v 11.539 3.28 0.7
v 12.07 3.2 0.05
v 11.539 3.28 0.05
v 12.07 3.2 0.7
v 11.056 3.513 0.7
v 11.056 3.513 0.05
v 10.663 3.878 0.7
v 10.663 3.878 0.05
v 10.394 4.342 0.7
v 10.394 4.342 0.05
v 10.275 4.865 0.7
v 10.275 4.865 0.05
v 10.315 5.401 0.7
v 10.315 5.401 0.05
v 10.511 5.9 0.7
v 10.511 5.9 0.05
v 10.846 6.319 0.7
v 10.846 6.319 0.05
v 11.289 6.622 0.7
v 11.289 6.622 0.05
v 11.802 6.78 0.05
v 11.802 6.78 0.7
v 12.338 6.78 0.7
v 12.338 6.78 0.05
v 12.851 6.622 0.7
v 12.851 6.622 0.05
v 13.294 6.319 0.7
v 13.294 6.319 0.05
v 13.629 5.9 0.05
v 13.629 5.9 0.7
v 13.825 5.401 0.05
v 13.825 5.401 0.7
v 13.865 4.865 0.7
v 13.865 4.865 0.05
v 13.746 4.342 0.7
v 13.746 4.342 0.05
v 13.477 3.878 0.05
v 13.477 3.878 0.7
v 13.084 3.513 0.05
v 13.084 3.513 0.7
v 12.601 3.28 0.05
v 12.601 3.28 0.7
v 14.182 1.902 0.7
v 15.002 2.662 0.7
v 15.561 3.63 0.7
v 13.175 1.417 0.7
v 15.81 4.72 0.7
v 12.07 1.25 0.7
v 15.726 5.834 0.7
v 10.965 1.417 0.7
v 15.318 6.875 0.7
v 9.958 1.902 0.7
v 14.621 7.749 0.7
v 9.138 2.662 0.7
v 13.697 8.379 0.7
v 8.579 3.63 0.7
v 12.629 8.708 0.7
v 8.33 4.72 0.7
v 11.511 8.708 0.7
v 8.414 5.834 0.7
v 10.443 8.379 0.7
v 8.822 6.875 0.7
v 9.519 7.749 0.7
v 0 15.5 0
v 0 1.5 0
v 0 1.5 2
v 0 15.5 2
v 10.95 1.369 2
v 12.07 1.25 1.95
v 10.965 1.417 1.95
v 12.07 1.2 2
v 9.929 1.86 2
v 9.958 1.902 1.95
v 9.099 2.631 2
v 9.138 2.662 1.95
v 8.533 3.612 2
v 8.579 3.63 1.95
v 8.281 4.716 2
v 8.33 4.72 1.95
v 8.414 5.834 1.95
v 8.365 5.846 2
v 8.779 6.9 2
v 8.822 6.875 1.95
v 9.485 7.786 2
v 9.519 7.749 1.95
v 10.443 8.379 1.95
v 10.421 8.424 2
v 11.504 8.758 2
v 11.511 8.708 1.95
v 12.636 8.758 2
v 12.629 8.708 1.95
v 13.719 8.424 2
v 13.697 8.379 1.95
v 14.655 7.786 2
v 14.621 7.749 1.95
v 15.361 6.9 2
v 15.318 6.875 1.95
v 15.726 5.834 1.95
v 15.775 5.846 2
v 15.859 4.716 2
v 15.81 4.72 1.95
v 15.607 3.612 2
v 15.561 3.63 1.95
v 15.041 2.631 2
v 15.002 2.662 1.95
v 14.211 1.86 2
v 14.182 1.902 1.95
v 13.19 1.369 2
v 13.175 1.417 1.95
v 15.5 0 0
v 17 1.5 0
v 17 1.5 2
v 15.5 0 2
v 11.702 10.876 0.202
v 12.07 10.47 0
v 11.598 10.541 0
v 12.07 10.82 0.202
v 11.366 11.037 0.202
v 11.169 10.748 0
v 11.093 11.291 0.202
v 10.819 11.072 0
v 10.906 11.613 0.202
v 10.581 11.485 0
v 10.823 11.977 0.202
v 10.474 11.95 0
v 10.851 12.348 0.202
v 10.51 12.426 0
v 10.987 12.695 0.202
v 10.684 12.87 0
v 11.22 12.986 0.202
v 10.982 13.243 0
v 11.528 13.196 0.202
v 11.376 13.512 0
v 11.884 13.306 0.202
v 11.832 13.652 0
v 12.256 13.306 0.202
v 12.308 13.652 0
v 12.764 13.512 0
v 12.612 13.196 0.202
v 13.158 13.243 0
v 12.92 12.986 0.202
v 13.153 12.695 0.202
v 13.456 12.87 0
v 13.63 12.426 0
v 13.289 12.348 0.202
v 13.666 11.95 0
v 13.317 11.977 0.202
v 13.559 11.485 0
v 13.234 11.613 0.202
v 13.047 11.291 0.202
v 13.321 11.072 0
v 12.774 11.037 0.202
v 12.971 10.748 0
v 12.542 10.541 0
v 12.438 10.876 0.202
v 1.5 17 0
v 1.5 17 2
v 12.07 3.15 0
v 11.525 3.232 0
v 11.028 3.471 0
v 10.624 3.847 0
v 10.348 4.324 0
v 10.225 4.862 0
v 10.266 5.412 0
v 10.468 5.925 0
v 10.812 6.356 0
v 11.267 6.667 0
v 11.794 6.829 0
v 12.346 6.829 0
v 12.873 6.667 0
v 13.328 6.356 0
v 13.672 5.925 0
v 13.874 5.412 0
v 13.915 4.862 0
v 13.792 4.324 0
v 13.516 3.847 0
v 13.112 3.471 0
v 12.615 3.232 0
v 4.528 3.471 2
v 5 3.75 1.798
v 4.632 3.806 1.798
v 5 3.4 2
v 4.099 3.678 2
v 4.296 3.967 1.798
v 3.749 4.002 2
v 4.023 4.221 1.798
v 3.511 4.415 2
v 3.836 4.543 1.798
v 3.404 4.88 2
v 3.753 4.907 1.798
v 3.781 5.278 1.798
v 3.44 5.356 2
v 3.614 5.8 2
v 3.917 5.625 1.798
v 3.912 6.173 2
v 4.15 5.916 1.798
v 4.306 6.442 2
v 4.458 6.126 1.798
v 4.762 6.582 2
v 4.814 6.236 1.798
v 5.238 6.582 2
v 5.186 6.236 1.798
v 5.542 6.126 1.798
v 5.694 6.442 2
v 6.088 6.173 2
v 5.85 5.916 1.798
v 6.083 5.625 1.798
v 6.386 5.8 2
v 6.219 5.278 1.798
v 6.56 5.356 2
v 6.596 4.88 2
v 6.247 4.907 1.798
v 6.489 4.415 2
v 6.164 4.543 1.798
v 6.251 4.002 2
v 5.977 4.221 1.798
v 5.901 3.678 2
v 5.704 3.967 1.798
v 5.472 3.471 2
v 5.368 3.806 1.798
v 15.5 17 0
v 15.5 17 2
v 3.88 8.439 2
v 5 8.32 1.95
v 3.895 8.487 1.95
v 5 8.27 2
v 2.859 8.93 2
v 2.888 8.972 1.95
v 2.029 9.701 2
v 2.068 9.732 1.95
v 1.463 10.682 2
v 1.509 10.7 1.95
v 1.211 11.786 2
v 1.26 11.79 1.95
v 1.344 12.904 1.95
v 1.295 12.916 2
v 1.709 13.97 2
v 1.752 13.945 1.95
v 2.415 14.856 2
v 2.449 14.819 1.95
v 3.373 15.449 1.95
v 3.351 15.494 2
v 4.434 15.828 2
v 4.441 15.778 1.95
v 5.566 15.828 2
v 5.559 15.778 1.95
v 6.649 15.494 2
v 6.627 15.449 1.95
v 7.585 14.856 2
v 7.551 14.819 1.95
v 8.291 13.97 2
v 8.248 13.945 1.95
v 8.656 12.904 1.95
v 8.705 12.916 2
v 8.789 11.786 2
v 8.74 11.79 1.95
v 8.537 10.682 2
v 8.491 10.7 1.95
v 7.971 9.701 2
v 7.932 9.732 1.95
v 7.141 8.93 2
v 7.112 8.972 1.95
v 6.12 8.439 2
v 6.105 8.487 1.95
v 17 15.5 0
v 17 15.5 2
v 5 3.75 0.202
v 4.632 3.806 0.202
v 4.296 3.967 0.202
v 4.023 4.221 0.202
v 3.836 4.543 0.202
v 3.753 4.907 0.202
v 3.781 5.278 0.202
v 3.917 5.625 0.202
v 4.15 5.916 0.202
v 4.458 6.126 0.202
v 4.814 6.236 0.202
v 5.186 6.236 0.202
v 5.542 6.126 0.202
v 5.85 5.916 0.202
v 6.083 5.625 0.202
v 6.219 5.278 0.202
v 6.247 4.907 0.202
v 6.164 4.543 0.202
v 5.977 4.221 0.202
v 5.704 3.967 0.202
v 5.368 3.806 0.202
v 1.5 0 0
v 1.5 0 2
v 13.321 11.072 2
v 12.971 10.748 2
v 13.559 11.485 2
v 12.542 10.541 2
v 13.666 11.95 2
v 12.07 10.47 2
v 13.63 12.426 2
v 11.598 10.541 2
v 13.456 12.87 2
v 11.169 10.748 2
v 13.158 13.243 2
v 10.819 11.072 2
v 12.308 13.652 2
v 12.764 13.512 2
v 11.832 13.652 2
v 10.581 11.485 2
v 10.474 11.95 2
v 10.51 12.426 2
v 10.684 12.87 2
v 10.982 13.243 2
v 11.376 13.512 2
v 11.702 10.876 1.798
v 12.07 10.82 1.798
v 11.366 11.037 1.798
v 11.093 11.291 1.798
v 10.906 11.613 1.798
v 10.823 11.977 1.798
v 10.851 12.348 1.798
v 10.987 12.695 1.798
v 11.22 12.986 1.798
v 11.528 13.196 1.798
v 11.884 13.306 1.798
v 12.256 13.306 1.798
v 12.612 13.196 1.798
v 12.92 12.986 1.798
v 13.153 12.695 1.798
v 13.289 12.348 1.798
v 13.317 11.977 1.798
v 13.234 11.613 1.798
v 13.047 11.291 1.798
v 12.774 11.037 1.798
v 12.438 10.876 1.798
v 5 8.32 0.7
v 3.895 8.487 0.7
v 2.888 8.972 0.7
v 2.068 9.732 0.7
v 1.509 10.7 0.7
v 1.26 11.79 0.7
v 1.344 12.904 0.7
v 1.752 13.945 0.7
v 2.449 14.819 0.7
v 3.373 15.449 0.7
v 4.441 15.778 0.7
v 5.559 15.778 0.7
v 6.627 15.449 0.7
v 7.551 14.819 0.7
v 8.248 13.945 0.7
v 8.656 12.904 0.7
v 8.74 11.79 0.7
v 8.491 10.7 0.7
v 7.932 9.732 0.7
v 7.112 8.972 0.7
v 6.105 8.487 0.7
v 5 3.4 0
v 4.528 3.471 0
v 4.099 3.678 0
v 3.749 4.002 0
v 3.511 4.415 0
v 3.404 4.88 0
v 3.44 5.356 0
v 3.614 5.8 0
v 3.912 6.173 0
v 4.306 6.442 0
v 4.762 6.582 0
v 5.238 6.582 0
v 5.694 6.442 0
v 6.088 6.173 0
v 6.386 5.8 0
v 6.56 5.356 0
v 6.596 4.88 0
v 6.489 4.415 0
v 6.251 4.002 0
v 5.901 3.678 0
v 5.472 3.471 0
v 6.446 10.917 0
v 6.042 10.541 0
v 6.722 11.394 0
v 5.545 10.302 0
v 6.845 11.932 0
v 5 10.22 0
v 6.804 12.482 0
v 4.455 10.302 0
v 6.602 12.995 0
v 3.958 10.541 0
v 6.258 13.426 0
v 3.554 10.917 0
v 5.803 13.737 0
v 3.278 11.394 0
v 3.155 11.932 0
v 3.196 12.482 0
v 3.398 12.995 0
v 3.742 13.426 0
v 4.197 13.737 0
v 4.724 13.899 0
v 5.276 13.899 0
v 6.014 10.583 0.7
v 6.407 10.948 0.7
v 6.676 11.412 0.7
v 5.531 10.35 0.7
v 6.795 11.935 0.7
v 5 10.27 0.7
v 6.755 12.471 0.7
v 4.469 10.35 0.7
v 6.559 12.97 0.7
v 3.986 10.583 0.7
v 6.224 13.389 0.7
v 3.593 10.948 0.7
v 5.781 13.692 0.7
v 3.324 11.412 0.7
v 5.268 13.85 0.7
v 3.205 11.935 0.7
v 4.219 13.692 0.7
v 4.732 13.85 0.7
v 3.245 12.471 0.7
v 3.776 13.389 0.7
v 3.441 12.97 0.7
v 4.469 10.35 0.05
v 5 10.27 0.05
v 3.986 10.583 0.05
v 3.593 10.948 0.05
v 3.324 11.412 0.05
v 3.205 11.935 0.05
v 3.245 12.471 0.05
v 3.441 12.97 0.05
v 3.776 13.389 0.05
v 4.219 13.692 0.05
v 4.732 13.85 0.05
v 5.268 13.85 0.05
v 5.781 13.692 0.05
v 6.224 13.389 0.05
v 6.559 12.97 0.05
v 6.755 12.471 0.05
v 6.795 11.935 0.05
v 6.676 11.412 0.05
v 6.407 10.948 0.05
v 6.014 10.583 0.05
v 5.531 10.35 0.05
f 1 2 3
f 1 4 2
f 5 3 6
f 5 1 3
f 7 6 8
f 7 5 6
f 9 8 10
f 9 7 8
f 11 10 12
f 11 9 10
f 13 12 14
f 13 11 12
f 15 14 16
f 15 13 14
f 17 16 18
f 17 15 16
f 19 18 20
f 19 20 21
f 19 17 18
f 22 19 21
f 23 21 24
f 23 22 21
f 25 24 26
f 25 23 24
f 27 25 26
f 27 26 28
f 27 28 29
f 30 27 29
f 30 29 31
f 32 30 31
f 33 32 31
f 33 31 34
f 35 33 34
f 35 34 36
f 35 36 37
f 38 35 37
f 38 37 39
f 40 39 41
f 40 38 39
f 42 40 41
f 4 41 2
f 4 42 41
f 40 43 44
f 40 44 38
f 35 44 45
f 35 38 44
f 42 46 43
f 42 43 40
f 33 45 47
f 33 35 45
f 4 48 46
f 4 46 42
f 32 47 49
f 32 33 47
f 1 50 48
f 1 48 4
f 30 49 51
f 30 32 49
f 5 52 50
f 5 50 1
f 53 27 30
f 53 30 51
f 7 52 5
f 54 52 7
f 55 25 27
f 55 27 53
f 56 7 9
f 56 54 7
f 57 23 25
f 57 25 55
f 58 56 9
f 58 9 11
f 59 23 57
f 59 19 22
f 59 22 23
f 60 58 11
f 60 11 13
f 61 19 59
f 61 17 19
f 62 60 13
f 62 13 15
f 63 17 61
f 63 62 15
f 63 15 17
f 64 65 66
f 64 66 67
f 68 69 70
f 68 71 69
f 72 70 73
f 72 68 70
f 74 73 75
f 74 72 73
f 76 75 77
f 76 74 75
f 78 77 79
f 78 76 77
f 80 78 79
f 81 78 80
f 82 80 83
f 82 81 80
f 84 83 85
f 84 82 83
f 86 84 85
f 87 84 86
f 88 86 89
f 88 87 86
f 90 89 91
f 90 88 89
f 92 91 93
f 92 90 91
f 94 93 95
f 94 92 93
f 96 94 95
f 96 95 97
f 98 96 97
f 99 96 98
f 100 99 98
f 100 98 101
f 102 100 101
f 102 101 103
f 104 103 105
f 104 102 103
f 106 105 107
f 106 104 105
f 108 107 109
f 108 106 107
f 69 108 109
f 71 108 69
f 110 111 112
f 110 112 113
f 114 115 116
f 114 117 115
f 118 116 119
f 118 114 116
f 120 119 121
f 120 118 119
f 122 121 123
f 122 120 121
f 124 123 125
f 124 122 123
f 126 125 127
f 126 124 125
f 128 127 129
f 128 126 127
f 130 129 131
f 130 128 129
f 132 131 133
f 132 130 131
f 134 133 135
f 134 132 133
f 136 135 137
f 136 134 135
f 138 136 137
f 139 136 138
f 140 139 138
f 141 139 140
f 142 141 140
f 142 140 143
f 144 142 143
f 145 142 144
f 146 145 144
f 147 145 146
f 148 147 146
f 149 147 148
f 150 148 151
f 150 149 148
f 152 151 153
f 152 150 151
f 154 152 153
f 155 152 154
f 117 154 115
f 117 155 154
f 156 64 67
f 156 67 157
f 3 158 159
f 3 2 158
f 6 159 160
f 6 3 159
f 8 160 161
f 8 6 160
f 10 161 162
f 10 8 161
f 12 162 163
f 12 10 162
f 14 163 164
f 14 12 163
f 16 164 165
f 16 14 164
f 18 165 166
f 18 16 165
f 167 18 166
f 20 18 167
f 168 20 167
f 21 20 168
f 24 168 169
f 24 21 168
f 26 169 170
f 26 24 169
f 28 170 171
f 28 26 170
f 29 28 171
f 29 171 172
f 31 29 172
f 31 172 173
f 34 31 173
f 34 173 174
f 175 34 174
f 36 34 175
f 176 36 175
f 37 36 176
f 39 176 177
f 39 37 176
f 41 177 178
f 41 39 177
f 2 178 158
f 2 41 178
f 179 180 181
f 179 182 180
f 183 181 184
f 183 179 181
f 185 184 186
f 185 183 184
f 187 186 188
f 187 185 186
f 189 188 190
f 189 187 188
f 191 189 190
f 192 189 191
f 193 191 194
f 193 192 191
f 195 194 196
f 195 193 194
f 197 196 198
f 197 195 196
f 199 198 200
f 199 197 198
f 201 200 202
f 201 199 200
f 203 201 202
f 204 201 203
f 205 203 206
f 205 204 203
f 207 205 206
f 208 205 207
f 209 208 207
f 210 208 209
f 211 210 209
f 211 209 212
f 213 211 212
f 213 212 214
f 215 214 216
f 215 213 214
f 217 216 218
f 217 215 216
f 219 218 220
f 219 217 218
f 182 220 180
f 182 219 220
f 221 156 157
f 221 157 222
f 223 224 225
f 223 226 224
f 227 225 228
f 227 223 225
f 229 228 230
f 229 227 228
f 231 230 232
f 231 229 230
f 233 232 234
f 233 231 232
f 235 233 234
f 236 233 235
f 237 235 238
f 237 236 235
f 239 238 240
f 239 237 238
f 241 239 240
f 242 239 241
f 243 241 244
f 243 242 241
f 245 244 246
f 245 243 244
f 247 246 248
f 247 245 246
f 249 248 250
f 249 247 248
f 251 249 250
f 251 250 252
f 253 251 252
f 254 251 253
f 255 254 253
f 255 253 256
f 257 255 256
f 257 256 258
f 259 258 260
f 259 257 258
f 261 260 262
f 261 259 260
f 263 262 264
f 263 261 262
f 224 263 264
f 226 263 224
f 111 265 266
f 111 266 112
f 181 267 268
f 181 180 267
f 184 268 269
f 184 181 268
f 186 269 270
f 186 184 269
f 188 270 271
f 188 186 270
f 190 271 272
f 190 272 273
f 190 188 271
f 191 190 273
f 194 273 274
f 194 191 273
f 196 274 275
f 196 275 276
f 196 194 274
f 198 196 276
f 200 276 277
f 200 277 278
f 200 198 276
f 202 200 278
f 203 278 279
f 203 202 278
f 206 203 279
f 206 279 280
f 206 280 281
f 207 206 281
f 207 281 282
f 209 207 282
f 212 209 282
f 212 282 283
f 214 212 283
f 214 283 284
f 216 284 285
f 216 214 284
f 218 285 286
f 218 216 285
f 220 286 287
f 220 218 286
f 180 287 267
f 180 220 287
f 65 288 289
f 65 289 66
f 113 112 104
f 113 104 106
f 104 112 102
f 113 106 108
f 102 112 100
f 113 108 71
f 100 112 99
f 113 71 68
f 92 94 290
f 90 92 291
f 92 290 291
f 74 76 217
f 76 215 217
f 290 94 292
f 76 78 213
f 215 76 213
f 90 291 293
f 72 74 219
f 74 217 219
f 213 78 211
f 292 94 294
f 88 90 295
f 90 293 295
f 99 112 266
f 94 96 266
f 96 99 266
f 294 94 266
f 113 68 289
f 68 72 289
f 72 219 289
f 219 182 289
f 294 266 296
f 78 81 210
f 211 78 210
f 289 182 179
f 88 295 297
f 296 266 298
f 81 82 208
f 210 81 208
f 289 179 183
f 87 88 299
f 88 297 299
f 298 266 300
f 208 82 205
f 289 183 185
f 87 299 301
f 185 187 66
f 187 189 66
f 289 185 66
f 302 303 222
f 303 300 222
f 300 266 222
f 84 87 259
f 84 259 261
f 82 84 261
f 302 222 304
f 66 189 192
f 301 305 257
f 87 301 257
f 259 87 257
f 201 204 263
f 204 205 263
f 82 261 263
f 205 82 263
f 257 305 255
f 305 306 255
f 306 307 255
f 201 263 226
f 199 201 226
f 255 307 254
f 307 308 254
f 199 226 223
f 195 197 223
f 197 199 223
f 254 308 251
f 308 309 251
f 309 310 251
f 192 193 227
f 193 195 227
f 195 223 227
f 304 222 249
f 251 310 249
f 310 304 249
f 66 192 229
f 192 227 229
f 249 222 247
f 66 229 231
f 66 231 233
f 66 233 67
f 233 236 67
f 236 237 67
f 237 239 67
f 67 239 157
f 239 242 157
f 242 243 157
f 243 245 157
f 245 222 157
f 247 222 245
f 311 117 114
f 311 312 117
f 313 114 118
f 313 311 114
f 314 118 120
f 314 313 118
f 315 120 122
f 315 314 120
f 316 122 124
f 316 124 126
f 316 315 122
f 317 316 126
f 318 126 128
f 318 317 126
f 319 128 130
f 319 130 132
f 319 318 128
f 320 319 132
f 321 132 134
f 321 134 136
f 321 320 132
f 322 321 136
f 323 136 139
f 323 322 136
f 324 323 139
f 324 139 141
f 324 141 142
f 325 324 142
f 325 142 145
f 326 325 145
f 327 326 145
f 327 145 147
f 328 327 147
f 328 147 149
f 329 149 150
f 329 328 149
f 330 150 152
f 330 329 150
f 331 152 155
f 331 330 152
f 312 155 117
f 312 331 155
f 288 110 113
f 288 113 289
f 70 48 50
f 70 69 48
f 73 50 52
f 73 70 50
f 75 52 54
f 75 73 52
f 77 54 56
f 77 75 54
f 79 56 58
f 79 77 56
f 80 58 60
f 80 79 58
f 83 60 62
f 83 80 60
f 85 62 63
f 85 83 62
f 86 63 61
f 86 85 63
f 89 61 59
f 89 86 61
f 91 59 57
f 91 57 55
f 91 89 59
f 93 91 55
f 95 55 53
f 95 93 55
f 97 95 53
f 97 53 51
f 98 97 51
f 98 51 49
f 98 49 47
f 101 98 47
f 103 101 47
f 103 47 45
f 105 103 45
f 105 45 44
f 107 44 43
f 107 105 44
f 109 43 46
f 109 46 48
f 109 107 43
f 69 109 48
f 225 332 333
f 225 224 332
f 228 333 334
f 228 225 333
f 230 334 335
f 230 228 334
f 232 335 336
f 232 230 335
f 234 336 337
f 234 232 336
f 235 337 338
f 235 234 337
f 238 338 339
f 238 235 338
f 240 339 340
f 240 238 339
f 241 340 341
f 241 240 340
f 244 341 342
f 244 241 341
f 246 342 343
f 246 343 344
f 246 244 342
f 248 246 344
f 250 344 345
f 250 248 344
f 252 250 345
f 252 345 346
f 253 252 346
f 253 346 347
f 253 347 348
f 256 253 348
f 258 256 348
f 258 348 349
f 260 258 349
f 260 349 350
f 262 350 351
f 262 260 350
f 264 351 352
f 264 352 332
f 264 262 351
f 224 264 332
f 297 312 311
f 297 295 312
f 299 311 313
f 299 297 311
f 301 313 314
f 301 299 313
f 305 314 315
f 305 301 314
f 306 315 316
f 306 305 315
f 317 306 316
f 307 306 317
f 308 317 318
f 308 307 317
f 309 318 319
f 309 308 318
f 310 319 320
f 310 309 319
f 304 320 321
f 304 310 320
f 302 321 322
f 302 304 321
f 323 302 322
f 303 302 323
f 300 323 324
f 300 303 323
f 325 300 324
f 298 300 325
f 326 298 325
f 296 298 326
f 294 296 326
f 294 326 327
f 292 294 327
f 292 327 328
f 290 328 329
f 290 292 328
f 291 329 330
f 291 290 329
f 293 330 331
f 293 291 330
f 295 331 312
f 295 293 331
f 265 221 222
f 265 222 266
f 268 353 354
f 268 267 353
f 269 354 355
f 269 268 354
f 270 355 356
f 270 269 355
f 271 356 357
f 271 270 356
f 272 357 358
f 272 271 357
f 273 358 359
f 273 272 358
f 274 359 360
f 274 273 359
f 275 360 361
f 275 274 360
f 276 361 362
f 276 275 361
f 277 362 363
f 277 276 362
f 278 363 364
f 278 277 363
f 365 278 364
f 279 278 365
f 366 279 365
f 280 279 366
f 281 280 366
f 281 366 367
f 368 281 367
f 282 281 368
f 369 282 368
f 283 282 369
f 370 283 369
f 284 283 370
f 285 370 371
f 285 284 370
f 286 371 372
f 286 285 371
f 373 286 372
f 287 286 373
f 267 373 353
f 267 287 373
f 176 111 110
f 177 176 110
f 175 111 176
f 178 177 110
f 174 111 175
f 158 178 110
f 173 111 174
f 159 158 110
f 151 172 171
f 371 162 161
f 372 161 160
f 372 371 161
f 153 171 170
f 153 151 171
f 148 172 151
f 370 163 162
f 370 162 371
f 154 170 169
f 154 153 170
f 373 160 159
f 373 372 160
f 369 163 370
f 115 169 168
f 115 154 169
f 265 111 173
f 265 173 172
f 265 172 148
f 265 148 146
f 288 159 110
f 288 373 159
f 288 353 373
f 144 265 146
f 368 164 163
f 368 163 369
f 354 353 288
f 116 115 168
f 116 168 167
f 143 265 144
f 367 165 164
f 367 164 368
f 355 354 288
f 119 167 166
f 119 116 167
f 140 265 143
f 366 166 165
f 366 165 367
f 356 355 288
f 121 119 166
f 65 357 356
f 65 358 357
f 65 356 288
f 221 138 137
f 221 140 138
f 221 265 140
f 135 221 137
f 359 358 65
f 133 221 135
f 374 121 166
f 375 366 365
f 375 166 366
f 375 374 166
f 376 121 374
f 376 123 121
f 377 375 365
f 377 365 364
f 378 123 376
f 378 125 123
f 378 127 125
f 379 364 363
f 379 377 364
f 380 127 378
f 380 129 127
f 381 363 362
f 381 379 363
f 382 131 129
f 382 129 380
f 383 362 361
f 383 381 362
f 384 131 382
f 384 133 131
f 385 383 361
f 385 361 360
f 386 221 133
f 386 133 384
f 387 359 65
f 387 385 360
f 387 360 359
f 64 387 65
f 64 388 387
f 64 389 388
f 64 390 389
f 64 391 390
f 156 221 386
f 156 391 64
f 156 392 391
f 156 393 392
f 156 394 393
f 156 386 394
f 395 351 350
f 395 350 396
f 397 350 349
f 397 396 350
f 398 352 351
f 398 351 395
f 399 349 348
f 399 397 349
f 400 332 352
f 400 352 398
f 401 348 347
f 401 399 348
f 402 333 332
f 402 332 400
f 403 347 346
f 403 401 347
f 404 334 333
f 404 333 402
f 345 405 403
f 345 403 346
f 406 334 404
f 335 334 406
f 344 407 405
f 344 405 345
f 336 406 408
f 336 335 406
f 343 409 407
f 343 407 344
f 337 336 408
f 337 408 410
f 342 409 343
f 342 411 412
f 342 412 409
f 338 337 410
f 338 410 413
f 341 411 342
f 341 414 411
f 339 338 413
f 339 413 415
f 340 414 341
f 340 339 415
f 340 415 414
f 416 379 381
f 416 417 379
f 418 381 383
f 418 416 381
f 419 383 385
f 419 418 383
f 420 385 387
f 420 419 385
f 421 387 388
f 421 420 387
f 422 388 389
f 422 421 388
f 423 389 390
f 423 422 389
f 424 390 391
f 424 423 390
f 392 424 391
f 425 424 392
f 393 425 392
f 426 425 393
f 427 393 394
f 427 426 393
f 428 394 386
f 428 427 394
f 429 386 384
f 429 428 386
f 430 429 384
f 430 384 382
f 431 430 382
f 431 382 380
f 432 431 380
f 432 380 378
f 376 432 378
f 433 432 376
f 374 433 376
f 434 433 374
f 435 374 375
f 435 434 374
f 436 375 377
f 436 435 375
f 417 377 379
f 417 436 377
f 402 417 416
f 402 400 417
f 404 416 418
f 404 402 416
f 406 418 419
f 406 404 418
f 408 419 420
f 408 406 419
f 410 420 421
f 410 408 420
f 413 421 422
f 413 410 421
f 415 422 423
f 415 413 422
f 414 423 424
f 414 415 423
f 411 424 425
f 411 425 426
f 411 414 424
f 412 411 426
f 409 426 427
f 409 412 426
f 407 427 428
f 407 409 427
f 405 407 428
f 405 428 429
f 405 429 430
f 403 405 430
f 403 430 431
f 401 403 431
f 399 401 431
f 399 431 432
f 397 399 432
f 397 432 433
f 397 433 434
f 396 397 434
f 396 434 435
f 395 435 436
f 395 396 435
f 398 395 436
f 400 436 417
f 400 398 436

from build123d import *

# Parameters (mm, degrees)
SKETCH_1_R                 = 1
EXTRUDE_1_DEPTH            = 2
M3X0_51_AT_2_COUNT         = 2
M3X0_51_AT_2_PITCH         = 9.998489886
HOLE_WIZARD_M31_AT_2_COUNT = 2
HOLE_WIZARD_M31_AT_2_PITCH = 9.998489886


with BuildPart() as part:
    # Эскиз1 → Бобышка-Вытянуть1 (new body)
    with BuildSketch(Plane.XY):
        Polygon((0, 15.5), (1.5, 17), (15.5, 17), (17, 15.5), (17, 1.5), (15.5, 0), (1.5, 0), (0, 1.5), align=None)
        with Locations((5, 5)):
            Circle(SKETCH_1_R, mode=Mode.SUBTRACT)
        with Locations((12.07, 5)):
            Circle(SKETCH_1_R, mode=Mode.SUBTRACT)
        with Locations((12.07, 12.07)):
            Circle(SKETCH_1_R, mode=Mode.SUBTRACT)
        with Locations((5, 12.07)):
            Circle(SKETCH_1_R, mode=Mode.SUBTRACT)
    extrude(amount=EXTRUDE_1_DEPTH)

    # Эскиз2 → Отверстие обработанное метчиком M3x0.51 (revolve, cut)
    with BuildSketch(Plane(origin=(12.07, 12.07, 2), x_dir=(0, -1, 0), z_dir=(1, 0, 0))):
        Polygon((0, 0), (0, 2), (1.6, 2), (1.25, 1.797927406), (1.25, 0.202072594), (1.6, 0), align=None)
    m3x0_51 = revolve(axis=Axis((12.07, 12.07, 8.35), (0, 0, -1)), mode=Mode.SUBTRACT)

    # Отверстие обработанное метчиком M3x0.51 at 2: Отверстие обработанное метчиком M3x0.51 ×2
    with Locations(*[Vector(-0.707106781, -0.707106781, 0) * (i * M3X0_51_AT_2_PITCH) for i in range(1, M3X0_51_AT_2_COUNT)]):
        add(m3x0_51, mode=Mode.SUBTRACT)

    # Эскиз4 → Цековка для винта с заклепочной головкой M31 (revolve, cut)
    with BuildSketch(Plane(origin=(5, 12.07, 2), x_dir=(0, -1, 0), z_dir=(1, 0, 0))):
        Polygon((0, 0), (0, 2), (1.85, 2), (1.8, 1.95), (1.8, 1.3), (3.75, 1.3), (3.75, 0.05), (3.8, 0), align=None)
    hole_wizard_m31 = revolve(axis=Axis((5, 12.07, 8.35), (0, 0, -1)), mode=Mode.SUBTRACT)

    # Цековка для винта с заклепочной головкой M31 at 2: Цековка для винта с заклепочной головкой M31 ×2
    with Locations(*[Vector(0.707106781, -0.707106781, 0) * (i * HOLE_WIZARD_M31_AT_2_PITCH) for i in range(1, HOLE_WIZARD_M31_AT_2_COUNT)]):
        add(hole_wizard_m31, mode=Mode.SUBTRACT)


solid = part.part
